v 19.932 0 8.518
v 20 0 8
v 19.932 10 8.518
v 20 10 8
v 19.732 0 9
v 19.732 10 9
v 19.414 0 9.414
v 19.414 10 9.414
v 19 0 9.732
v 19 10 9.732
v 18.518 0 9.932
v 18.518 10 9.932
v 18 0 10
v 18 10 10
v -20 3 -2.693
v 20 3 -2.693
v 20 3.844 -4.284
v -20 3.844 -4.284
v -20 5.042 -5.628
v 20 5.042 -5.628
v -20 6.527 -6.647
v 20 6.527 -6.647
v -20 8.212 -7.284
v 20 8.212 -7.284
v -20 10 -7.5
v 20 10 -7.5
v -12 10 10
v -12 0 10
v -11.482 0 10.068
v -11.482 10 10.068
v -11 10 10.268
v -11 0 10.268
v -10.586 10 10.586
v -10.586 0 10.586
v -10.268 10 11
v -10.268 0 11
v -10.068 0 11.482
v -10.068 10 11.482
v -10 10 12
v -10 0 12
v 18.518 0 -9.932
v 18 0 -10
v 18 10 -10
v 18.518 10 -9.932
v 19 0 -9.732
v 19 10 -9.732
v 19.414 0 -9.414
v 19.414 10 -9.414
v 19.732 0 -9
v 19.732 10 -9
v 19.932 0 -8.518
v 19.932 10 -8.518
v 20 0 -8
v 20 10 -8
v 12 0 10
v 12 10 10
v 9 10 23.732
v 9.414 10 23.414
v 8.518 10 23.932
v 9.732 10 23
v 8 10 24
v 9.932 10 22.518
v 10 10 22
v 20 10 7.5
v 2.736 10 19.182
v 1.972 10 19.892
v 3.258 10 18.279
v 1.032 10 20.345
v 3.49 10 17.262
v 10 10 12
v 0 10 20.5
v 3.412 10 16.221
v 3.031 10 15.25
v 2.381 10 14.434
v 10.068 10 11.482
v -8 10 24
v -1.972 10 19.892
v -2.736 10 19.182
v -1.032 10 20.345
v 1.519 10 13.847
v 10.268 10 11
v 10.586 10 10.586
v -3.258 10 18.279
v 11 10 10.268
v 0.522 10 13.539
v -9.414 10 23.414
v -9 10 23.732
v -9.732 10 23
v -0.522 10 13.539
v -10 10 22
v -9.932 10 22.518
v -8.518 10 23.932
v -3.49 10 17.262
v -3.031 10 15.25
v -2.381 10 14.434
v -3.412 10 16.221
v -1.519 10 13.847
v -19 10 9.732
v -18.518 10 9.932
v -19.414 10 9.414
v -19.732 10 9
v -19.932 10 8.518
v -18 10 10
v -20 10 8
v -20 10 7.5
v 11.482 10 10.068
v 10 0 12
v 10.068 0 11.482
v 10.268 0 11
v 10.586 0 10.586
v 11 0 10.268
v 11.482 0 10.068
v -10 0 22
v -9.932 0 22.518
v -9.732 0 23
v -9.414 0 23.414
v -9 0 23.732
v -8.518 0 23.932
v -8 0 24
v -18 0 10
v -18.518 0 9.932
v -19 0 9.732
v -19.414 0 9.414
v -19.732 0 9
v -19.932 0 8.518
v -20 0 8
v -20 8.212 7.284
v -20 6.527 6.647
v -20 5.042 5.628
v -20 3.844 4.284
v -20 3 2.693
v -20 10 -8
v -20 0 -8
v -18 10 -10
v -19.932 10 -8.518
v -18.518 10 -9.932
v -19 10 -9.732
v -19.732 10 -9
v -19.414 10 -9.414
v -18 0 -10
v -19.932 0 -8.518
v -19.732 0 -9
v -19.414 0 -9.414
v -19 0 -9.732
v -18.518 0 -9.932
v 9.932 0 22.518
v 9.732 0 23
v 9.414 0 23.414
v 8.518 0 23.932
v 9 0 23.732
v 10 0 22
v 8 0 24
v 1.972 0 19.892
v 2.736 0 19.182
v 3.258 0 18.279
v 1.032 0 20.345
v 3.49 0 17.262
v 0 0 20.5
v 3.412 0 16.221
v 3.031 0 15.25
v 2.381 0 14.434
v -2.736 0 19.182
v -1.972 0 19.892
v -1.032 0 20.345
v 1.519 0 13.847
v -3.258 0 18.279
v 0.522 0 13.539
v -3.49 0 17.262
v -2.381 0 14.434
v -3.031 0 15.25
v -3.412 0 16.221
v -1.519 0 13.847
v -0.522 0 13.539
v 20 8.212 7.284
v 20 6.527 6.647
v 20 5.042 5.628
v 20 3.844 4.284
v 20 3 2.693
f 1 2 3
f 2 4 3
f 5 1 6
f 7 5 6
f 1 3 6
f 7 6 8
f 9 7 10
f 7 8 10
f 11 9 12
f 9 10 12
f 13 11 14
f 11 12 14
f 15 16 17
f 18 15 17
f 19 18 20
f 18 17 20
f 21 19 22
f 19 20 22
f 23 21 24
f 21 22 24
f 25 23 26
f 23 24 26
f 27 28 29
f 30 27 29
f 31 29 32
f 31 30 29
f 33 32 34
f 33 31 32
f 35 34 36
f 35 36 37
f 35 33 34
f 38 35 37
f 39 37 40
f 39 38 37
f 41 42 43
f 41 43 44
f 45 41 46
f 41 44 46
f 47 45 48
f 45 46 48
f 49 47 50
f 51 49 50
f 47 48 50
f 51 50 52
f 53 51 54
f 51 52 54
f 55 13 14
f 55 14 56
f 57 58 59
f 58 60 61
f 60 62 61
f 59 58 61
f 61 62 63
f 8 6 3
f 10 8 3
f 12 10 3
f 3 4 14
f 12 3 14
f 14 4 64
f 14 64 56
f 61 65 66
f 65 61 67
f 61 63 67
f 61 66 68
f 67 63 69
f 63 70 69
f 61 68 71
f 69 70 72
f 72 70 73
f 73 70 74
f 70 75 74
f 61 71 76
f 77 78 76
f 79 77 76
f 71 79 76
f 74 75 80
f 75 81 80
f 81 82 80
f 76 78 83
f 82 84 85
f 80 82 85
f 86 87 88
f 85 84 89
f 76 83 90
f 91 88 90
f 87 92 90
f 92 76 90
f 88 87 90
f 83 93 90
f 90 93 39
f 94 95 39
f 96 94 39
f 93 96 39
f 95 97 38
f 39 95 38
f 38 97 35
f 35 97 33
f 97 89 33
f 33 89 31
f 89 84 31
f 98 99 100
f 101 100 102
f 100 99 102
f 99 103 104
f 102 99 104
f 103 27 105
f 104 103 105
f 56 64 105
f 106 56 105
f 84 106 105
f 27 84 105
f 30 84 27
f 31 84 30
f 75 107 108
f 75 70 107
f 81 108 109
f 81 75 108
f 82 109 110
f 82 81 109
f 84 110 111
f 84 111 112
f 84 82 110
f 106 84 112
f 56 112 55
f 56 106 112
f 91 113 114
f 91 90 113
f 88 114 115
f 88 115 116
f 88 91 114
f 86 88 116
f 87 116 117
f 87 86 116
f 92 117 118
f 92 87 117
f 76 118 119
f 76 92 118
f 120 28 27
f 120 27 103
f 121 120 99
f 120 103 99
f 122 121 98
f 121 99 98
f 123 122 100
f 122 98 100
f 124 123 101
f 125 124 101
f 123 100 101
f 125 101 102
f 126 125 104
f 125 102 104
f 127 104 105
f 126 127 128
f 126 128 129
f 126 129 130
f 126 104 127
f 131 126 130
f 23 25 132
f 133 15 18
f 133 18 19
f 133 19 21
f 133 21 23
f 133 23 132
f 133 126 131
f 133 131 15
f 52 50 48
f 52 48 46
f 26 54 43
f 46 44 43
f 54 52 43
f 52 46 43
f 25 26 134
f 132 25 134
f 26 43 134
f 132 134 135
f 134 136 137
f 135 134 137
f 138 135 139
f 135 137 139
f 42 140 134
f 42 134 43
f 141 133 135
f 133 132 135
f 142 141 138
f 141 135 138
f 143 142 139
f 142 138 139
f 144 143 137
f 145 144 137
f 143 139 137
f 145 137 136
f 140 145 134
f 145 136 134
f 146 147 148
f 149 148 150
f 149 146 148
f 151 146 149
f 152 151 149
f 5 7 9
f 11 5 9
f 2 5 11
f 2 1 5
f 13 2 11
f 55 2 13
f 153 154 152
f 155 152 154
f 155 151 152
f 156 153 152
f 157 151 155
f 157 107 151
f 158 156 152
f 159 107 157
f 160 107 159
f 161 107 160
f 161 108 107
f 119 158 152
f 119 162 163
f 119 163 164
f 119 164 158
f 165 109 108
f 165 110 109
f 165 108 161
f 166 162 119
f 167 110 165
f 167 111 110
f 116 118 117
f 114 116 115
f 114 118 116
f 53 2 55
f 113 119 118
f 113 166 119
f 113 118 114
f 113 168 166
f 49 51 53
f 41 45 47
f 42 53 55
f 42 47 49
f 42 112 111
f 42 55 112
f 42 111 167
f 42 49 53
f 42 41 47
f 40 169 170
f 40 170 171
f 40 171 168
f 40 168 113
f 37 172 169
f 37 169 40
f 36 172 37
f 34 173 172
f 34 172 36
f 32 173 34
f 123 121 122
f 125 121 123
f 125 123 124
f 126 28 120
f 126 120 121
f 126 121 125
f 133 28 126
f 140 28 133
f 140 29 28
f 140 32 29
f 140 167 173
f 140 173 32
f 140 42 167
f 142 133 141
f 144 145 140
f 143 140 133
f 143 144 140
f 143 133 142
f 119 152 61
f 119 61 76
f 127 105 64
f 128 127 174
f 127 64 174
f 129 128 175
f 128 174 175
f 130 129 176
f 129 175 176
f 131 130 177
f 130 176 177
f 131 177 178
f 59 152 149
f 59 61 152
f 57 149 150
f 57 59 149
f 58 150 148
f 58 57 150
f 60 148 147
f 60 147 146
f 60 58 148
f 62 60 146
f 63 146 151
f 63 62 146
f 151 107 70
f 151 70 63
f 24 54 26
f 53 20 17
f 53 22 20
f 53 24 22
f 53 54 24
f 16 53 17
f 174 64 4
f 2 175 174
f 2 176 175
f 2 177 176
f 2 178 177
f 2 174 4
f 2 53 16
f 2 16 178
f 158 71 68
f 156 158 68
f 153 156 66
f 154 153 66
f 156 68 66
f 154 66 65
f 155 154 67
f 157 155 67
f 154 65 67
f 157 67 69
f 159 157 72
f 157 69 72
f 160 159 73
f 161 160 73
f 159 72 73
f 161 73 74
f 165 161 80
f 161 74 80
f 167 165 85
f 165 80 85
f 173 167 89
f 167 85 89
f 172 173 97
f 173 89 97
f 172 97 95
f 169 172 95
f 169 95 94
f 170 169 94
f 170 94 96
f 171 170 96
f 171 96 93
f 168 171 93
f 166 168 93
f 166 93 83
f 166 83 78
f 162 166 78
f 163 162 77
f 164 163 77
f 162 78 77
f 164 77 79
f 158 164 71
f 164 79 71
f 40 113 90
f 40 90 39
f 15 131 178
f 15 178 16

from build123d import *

# Parameters (mm, degrees)
BOSS_EXTRUDE1_DEPTH = 10
SKETCH2_R           = 3.5
CUT_EXTRUDE1_DEPTH  = 10
CUT_EXTRUDE2_DEPTH  = 48.707441768
FILLET1_R           = 2


with BuildPart() as part:
    # Sketch1 → Boss-Extrude1 (new body)
    with BuildSketch(Plane(origin=(0, 0, 0), x_dir=(1, 0, 0), z_dir=(0, 1, 0))):
        Polygon((-10, -10), (-20, -10), (-20, 10), (20, 10), (20, -10), (10, -10), (10, -24), (-10, -24), align=None)
    extrude(amount=BOSS_EXTRUDE1_DEPTH)

    # Sketch2 → Cut-Extrude1 (cut)
    with BuildSketch(Plane(origin=(0, 10, 0), x_dir=(1, 0, 0), z_dir=(0, 1, 0))):
        with Locations(Location((0, -17, 0), (0, 0, 270))):
            Circle(SKETCH2_R)
    extrude(amount=-CUT_EXTRUDE1_DEPTH, mode=Mode.SUBTRACT)

    # Sketch3 → Cut-Extrude2 (cut, through all)
    with BuildSketch(Plane(origin=(20, 0, 0), x_dir=(0, 0, -1), z_dir=(1, 0, 0))):
        with BuildLine():
            Line((-2.692582404, 3), (2.692582404, 3))
            ThreePointArc((2.692582404, 3), (0, 17.5), (-2.692582404, 3))
        make_face()
    extrude(amount=-CUT_EXTRUDE2_DEPTH, mode=Mode.SUBTRACT)

    # Fillet1
    fillet1_edges = [part.edges().sort_by_distance(p)[0] for p in [
        (-20, 5, -10),
        (20, 5, -10),
        (20, 5, 10),
        (10, 5, 10),
        (10, 5, 24),
        (-10, 5, 24),
        (-10, 5, 10),
        (-20, 5, 10),
    ]]
    fillet(fillet1_edges, radius=FILLET1_R)


solid = part.part
